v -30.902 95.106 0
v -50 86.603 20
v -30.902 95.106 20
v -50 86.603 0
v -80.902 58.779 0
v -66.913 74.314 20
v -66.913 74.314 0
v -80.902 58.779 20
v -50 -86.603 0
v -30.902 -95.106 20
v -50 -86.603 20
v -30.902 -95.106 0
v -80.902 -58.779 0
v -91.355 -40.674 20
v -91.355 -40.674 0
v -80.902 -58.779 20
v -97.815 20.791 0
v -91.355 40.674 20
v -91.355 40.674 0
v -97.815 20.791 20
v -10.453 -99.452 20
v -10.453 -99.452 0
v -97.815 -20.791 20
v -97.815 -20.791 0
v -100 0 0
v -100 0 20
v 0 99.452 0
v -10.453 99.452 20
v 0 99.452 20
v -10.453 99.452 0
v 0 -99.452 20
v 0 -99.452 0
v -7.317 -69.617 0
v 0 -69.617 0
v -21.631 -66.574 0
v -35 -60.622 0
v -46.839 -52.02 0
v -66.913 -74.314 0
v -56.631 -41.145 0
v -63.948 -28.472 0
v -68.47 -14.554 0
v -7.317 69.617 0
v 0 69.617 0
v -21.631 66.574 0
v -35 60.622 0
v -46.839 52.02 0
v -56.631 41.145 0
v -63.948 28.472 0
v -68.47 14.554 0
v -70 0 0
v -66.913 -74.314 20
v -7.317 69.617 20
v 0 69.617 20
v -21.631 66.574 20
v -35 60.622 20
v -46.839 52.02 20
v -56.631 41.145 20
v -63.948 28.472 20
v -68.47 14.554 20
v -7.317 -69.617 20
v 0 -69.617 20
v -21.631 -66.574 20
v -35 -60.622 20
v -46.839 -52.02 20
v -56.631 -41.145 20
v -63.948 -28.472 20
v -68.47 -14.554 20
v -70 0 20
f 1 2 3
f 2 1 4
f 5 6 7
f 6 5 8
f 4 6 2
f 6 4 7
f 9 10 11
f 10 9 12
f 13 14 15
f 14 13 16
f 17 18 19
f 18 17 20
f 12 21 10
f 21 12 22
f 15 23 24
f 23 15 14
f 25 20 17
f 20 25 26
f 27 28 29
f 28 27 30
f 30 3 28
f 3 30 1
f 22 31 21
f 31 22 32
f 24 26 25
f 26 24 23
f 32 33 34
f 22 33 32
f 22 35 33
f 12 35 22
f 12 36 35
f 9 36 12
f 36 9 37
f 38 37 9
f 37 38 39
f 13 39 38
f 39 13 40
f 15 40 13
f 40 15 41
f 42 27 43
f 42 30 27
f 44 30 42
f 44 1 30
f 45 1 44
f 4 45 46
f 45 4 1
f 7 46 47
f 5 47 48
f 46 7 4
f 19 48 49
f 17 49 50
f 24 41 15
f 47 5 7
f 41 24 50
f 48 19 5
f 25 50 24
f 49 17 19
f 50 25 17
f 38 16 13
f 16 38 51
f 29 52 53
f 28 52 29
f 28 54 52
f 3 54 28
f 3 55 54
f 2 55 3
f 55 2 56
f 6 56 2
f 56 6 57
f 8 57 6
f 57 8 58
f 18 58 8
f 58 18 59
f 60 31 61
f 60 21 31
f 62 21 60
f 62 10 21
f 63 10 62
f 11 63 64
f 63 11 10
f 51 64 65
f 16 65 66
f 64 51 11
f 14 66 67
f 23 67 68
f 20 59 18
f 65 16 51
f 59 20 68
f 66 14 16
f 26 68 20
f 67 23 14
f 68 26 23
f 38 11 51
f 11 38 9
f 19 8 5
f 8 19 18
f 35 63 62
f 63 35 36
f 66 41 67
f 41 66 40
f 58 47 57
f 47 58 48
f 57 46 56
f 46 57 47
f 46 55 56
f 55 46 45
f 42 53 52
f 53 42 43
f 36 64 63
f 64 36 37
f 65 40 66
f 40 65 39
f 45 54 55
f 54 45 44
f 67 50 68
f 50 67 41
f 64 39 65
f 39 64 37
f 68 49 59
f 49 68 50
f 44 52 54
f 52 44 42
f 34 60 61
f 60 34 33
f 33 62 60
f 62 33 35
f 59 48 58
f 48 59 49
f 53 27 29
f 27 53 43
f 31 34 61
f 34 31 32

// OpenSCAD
module quart(radius, depth, quarts=3, center=false, radius1=0) {

  difference() {

    cylinder(depth, r=radius, center=center);

    cylinder(depth, r=radius1, center=center);

    cz = center ? - depth / 2 : 0;
    if (quarts > 0)
      translate([ 0, 0, cz ]) cube([ radius, radius, depth ]);
    if (quarts > 1)
      translate([ 0, -radius, cz ]) cube([ radius, radius, depth ]);
    if (quarts > 2)
      translate([ -radius, -radius, cz ]) cube([ radius, radius, depth ]);
  }
}
quart(100, 20, 2, false, radius1=70);
